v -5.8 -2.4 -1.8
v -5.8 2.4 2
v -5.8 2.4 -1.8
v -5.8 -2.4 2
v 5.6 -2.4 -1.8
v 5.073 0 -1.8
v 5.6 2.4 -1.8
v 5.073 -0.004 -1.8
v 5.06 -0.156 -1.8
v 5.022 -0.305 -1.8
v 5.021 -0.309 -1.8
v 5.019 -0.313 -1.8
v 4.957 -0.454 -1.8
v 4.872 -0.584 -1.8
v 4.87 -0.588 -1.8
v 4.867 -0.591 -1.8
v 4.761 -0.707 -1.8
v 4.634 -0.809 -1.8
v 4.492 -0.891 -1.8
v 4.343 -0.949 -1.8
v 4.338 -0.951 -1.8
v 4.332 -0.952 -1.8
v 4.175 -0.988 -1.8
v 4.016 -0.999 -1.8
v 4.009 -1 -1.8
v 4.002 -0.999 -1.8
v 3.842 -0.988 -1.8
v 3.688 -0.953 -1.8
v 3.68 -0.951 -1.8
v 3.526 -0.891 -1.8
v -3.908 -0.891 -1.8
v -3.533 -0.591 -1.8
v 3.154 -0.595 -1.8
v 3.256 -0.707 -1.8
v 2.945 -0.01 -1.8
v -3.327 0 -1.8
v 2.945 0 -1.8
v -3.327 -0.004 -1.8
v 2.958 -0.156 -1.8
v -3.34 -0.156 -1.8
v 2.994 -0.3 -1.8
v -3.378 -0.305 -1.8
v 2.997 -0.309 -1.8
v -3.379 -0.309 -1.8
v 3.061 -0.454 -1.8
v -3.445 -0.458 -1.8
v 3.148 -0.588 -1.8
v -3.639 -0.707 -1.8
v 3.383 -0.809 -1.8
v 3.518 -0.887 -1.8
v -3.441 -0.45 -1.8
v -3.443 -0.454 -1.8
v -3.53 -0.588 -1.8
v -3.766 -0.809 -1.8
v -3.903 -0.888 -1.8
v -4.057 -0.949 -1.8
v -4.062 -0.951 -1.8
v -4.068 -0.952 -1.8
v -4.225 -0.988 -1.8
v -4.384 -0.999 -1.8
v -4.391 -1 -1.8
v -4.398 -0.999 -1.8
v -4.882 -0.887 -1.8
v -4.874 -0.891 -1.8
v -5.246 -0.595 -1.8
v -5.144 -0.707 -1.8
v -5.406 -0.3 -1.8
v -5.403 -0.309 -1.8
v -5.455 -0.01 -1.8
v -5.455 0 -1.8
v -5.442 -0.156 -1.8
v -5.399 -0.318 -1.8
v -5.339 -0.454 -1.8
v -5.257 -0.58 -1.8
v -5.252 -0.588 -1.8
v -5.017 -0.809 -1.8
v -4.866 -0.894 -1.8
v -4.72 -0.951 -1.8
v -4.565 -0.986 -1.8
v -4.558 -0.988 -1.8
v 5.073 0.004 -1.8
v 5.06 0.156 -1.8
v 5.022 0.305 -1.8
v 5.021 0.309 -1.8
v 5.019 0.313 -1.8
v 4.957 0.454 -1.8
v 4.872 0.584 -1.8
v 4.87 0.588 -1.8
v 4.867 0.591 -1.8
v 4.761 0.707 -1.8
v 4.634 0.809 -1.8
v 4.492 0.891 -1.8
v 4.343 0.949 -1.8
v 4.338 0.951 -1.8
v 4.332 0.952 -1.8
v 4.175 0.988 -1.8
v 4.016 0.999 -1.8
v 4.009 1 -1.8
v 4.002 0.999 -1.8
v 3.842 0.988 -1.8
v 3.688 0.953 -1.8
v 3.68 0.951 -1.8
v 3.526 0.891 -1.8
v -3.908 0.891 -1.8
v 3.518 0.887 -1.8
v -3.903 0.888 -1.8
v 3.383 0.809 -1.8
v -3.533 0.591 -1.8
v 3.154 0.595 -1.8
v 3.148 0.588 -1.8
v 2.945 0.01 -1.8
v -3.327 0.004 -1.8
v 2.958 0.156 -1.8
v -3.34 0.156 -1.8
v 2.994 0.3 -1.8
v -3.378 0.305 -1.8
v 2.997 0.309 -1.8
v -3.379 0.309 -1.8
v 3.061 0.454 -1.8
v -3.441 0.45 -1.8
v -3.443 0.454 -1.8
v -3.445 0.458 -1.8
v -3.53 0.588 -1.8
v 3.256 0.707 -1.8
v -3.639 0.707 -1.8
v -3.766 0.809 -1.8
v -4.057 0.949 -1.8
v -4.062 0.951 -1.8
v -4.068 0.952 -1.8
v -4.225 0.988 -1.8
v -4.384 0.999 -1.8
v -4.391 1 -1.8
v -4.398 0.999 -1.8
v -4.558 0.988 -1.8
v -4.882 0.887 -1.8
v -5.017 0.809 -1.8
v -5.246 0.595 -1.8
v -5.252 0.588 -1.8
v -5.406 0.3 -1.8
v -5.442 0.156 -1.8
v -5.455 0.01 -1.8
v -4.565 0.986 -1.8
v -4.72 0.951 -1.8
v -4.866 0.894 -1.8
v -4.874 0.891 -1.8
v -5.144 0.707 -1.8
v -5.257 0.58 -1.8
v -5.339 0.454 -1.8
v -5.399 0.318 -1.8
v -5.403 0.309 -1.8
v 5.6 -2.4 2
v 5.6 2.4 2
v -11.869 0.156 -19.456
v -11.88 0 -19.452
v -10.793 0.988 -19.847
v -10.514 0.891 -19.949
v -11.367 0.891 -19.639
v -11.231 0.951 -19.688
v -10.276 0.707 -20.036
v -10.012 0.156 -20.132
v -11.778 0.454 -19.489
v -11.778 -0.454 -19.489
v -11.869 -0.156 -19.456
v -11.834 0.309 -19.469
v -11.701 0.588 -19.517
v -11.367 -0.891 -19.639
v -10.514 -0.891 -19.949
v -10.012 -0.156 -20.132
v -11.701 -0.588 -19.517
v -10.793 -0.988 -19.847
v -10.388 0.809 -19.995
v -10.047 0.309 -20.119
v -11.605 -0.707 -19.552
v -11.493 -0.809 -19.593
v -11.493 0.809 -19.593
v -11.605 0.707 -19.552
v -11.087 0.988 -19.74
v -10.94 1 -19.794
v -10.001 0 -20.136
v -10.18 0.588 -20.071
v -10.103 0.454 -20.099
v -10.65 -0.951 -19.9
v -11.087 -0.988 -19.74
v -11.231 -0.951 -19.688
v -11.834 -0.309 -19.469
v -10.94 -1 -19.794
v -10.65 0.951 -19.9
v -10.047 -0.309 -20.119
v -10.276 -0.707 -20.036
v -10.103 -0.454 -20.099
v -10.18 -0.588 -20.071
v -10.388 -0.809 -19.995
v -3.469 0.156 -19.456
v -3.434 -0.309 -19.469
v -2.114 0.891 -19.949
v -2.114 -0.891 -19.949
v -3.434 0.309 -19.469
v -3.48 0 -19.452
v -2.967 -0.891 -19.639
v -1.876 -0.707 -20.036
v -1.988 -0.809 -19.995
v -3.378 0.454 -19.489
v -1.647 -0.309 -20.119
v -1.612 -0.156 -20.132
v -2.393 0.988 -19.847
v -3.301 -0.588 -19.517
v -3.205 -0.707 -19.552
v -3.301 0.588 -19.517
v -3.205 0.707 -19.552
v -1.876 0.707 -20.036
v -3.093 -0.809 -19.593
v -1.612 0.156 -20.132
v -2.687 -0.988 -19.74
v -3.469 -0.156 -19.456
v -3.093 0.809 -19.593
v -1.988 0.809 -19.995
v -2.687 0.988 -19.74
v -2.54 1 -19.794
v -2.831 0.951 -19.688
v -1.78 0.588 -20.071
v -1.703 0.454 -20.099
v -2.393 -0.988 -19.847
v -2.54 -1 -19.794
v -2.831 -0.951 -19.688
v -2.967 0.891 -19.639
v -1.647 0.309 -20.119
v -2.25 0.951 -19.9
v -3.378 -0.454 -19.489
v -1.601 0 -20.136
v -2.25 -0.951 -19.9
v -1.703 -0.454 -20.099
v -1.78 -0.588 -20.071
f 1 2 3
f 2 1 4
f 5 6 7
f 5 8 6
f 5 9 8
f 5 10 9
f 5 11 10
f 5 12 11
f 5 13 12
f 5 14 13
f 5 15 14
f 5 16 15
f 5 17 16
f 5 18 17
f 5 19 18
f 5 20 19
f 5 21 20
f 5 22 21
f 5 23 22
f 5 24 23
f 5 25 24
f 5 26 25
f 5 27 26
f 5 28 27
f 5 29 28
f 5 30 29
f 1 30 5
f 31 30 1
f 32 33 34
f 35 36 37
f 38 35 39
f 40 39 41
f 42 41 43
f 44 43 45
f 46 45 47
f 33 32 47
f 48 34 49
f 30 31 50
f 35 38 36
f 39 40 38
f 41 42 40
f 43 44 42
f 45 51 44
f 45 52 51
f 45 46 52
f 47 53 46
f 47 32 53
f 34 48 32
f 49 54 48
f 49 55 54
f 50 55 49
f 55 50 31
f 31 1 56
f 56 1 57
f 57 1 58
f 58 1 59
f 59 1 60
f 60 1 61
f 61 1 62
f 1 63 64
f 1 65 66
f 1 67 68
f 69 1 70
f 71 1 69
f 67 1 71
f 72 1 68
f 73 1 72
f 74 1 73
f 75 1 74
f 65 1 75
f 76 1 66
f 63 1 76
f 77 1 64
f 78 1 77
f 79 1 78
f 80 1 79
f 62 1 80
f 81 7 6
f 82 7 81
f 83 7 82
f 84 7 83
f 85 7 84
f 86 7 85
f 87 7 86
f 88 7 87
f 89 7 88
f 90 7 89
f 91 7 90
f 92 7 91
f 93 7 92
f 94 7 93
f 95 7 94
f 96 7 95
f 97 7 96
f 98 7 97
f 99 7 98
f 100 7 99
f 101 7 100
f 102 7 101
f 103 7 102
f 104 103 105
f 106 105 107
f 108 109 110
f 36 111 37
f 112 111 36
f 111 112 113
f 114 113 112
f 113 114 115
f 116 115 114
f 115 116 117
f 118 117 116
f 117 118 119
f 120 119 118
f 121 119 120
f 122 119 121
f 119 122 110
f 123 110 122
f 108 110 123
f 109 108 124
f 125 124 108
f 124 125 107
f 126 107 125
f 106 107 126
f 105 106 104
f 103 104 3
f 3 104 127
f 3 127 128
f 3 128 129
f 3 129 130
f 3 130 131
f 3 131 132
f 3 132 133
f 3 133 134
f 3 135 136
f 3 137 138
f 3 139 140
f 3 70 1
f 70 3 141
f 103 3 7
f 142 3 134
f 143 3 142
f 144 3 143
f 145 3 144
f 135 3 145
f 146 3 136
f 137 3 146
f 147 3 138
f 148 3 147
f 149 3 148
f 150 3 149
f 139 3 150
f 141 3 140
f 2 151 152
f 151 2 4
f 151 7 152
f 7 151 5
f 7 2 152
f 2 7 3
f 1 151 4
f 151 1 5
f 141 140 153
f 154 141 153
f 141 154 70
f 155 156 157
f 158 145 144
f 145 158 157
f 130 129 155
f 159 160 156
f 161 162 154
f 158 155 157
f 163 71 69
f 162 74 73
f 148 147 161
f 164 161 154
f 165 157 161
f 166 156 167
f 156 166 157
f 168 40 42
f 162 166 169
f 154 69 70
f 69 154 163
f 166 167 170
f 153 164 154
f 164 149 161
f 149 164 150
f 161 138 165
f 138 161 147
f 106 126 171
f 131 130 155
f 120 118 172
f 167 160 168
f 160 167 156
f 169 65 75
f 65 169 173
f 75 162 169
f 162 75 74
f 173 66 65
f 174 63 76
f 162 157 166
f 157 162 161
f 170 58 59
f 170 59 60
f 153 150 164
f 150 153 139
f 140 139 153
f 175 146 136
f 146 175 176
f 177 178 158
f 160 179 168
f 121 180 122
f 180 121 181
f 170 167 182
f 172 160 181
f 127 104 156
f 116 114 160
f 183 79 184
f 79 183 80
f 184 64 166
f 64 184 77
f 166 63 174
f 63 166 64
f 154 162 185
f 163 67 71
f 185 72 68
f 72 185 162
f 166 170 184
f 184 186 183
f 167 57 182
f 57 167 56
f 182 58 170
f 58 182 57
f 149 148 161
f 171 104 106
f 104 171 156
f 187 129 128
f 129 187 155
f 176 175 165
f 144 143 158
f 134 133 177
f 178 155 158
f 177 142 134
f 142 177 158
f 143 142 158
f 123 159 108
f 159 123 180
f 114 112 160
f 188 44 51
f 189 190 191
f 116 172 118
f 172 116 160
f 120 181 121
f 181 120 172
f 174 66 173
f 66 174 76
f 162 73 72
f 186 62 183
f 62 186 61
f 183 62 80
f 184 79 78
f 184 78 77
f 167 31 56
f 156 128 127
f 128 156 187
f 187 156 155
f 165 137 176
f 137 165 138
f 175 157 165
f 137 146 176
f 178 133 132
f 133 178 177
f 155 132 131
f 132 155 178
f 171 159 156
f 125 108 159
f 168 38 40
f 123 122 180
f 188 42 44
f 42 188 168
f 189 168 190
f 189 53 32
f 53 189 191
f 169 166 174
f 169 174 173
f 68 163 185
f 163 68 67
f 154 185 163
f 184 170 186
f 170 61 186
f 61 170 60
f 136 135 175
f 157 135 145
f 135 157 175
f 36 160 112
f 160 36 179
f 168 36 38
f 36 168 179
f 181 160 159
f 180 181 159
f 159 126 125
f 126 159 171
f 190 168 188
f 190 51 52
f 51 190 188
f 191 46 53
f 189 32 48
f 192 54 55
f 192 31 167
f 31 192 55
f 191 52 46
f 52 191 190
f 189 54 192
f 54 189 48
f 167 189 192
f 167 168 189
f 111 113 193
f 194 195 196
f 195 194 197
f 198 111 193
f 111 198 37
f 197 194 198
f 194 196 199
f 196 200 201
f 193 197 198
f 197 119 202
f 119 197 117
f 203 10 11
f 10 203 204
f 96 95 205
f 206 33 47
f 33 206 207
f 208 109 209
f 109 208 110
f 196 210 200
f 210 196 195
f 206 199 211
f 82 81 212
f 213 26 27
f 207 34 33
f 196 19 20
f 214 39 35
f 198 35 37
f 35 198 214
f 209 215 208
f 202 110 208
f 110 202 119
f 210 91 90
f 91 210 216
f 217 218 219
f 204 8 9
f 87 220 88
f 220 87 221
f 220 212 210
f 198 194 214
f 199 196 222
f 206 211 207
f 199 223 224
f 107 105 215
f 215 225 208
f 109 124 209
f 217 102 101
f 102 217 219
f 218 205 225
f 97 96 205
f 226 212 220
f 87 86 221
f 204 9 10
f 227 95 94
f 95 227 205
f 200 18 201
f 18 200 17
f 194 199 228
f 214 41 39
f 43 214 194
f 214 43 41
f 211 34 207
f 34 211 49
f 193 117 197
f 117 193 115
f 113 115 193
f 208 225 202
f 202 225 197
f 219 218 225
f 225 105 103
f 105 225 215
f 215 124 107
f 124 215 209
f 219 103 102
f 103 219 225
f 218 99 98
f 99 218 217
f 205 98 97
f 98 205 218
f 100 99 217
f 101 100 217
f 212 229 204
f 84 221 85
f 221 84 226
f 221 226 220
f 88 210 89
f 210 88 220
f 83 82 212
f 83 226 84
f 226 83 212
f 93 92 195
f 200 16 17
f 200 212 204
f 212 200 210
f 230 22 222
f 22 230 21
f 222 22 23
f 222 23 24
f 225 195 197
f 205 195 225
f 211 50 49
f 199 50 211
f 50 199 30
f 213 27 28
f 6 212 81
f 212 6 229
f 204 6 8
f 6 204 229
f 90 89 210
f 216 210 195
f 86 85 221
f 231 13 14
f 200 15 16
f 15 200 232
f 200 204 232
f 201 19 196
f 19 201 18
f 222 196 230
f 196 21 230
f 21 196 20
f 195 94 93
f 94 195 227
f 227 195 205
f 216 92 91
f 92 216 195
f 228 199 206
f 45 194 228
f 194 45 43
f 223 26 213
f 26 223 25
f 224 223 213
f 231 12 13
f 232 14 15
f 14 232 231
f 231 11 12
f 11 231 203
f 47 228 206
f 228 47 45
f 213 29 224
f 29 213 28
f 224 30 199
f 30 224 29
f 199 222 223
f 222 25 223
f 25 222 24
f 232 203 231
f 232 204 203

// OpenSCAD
module endstop_switch(){
    cube([8.6,4.8,3]);
    //pads
    translate([-1.3,1,0]) cube([8.6+2*1.3,2.25,0.3]);
    //bottom connectors
    translate([2.3,2.4,-0.6]) cylinder(r=0.55,h=1,$fn=50);
    translate([6.3,2.4,-0.6]) cylinder(r=0.55,h=1,$fn=50);
    //switch
    translate([2.56,1.05,2.9]) cube([1,2.7,0.6]);
}

module endstop_hole(tilt){
    translate([4.3,-2.4,-1])rotate([0,180,0]){
        translate([-1.3,0,-3])cube([11.4,4.8,0.6+3+0.2]);
        translate([8.4,2.4,0]) rotate([0,tilt,0])cylinder(r=1,h=20,$fn=40);
        translate([0,2.4,0]) rotate([0,tilt,0]) cylinder(r=1,h=20,$fn=40);
    }
}
//endstop_switch();
endstop_hole(20);
//translate([0,0,5]) endstop_switch();
